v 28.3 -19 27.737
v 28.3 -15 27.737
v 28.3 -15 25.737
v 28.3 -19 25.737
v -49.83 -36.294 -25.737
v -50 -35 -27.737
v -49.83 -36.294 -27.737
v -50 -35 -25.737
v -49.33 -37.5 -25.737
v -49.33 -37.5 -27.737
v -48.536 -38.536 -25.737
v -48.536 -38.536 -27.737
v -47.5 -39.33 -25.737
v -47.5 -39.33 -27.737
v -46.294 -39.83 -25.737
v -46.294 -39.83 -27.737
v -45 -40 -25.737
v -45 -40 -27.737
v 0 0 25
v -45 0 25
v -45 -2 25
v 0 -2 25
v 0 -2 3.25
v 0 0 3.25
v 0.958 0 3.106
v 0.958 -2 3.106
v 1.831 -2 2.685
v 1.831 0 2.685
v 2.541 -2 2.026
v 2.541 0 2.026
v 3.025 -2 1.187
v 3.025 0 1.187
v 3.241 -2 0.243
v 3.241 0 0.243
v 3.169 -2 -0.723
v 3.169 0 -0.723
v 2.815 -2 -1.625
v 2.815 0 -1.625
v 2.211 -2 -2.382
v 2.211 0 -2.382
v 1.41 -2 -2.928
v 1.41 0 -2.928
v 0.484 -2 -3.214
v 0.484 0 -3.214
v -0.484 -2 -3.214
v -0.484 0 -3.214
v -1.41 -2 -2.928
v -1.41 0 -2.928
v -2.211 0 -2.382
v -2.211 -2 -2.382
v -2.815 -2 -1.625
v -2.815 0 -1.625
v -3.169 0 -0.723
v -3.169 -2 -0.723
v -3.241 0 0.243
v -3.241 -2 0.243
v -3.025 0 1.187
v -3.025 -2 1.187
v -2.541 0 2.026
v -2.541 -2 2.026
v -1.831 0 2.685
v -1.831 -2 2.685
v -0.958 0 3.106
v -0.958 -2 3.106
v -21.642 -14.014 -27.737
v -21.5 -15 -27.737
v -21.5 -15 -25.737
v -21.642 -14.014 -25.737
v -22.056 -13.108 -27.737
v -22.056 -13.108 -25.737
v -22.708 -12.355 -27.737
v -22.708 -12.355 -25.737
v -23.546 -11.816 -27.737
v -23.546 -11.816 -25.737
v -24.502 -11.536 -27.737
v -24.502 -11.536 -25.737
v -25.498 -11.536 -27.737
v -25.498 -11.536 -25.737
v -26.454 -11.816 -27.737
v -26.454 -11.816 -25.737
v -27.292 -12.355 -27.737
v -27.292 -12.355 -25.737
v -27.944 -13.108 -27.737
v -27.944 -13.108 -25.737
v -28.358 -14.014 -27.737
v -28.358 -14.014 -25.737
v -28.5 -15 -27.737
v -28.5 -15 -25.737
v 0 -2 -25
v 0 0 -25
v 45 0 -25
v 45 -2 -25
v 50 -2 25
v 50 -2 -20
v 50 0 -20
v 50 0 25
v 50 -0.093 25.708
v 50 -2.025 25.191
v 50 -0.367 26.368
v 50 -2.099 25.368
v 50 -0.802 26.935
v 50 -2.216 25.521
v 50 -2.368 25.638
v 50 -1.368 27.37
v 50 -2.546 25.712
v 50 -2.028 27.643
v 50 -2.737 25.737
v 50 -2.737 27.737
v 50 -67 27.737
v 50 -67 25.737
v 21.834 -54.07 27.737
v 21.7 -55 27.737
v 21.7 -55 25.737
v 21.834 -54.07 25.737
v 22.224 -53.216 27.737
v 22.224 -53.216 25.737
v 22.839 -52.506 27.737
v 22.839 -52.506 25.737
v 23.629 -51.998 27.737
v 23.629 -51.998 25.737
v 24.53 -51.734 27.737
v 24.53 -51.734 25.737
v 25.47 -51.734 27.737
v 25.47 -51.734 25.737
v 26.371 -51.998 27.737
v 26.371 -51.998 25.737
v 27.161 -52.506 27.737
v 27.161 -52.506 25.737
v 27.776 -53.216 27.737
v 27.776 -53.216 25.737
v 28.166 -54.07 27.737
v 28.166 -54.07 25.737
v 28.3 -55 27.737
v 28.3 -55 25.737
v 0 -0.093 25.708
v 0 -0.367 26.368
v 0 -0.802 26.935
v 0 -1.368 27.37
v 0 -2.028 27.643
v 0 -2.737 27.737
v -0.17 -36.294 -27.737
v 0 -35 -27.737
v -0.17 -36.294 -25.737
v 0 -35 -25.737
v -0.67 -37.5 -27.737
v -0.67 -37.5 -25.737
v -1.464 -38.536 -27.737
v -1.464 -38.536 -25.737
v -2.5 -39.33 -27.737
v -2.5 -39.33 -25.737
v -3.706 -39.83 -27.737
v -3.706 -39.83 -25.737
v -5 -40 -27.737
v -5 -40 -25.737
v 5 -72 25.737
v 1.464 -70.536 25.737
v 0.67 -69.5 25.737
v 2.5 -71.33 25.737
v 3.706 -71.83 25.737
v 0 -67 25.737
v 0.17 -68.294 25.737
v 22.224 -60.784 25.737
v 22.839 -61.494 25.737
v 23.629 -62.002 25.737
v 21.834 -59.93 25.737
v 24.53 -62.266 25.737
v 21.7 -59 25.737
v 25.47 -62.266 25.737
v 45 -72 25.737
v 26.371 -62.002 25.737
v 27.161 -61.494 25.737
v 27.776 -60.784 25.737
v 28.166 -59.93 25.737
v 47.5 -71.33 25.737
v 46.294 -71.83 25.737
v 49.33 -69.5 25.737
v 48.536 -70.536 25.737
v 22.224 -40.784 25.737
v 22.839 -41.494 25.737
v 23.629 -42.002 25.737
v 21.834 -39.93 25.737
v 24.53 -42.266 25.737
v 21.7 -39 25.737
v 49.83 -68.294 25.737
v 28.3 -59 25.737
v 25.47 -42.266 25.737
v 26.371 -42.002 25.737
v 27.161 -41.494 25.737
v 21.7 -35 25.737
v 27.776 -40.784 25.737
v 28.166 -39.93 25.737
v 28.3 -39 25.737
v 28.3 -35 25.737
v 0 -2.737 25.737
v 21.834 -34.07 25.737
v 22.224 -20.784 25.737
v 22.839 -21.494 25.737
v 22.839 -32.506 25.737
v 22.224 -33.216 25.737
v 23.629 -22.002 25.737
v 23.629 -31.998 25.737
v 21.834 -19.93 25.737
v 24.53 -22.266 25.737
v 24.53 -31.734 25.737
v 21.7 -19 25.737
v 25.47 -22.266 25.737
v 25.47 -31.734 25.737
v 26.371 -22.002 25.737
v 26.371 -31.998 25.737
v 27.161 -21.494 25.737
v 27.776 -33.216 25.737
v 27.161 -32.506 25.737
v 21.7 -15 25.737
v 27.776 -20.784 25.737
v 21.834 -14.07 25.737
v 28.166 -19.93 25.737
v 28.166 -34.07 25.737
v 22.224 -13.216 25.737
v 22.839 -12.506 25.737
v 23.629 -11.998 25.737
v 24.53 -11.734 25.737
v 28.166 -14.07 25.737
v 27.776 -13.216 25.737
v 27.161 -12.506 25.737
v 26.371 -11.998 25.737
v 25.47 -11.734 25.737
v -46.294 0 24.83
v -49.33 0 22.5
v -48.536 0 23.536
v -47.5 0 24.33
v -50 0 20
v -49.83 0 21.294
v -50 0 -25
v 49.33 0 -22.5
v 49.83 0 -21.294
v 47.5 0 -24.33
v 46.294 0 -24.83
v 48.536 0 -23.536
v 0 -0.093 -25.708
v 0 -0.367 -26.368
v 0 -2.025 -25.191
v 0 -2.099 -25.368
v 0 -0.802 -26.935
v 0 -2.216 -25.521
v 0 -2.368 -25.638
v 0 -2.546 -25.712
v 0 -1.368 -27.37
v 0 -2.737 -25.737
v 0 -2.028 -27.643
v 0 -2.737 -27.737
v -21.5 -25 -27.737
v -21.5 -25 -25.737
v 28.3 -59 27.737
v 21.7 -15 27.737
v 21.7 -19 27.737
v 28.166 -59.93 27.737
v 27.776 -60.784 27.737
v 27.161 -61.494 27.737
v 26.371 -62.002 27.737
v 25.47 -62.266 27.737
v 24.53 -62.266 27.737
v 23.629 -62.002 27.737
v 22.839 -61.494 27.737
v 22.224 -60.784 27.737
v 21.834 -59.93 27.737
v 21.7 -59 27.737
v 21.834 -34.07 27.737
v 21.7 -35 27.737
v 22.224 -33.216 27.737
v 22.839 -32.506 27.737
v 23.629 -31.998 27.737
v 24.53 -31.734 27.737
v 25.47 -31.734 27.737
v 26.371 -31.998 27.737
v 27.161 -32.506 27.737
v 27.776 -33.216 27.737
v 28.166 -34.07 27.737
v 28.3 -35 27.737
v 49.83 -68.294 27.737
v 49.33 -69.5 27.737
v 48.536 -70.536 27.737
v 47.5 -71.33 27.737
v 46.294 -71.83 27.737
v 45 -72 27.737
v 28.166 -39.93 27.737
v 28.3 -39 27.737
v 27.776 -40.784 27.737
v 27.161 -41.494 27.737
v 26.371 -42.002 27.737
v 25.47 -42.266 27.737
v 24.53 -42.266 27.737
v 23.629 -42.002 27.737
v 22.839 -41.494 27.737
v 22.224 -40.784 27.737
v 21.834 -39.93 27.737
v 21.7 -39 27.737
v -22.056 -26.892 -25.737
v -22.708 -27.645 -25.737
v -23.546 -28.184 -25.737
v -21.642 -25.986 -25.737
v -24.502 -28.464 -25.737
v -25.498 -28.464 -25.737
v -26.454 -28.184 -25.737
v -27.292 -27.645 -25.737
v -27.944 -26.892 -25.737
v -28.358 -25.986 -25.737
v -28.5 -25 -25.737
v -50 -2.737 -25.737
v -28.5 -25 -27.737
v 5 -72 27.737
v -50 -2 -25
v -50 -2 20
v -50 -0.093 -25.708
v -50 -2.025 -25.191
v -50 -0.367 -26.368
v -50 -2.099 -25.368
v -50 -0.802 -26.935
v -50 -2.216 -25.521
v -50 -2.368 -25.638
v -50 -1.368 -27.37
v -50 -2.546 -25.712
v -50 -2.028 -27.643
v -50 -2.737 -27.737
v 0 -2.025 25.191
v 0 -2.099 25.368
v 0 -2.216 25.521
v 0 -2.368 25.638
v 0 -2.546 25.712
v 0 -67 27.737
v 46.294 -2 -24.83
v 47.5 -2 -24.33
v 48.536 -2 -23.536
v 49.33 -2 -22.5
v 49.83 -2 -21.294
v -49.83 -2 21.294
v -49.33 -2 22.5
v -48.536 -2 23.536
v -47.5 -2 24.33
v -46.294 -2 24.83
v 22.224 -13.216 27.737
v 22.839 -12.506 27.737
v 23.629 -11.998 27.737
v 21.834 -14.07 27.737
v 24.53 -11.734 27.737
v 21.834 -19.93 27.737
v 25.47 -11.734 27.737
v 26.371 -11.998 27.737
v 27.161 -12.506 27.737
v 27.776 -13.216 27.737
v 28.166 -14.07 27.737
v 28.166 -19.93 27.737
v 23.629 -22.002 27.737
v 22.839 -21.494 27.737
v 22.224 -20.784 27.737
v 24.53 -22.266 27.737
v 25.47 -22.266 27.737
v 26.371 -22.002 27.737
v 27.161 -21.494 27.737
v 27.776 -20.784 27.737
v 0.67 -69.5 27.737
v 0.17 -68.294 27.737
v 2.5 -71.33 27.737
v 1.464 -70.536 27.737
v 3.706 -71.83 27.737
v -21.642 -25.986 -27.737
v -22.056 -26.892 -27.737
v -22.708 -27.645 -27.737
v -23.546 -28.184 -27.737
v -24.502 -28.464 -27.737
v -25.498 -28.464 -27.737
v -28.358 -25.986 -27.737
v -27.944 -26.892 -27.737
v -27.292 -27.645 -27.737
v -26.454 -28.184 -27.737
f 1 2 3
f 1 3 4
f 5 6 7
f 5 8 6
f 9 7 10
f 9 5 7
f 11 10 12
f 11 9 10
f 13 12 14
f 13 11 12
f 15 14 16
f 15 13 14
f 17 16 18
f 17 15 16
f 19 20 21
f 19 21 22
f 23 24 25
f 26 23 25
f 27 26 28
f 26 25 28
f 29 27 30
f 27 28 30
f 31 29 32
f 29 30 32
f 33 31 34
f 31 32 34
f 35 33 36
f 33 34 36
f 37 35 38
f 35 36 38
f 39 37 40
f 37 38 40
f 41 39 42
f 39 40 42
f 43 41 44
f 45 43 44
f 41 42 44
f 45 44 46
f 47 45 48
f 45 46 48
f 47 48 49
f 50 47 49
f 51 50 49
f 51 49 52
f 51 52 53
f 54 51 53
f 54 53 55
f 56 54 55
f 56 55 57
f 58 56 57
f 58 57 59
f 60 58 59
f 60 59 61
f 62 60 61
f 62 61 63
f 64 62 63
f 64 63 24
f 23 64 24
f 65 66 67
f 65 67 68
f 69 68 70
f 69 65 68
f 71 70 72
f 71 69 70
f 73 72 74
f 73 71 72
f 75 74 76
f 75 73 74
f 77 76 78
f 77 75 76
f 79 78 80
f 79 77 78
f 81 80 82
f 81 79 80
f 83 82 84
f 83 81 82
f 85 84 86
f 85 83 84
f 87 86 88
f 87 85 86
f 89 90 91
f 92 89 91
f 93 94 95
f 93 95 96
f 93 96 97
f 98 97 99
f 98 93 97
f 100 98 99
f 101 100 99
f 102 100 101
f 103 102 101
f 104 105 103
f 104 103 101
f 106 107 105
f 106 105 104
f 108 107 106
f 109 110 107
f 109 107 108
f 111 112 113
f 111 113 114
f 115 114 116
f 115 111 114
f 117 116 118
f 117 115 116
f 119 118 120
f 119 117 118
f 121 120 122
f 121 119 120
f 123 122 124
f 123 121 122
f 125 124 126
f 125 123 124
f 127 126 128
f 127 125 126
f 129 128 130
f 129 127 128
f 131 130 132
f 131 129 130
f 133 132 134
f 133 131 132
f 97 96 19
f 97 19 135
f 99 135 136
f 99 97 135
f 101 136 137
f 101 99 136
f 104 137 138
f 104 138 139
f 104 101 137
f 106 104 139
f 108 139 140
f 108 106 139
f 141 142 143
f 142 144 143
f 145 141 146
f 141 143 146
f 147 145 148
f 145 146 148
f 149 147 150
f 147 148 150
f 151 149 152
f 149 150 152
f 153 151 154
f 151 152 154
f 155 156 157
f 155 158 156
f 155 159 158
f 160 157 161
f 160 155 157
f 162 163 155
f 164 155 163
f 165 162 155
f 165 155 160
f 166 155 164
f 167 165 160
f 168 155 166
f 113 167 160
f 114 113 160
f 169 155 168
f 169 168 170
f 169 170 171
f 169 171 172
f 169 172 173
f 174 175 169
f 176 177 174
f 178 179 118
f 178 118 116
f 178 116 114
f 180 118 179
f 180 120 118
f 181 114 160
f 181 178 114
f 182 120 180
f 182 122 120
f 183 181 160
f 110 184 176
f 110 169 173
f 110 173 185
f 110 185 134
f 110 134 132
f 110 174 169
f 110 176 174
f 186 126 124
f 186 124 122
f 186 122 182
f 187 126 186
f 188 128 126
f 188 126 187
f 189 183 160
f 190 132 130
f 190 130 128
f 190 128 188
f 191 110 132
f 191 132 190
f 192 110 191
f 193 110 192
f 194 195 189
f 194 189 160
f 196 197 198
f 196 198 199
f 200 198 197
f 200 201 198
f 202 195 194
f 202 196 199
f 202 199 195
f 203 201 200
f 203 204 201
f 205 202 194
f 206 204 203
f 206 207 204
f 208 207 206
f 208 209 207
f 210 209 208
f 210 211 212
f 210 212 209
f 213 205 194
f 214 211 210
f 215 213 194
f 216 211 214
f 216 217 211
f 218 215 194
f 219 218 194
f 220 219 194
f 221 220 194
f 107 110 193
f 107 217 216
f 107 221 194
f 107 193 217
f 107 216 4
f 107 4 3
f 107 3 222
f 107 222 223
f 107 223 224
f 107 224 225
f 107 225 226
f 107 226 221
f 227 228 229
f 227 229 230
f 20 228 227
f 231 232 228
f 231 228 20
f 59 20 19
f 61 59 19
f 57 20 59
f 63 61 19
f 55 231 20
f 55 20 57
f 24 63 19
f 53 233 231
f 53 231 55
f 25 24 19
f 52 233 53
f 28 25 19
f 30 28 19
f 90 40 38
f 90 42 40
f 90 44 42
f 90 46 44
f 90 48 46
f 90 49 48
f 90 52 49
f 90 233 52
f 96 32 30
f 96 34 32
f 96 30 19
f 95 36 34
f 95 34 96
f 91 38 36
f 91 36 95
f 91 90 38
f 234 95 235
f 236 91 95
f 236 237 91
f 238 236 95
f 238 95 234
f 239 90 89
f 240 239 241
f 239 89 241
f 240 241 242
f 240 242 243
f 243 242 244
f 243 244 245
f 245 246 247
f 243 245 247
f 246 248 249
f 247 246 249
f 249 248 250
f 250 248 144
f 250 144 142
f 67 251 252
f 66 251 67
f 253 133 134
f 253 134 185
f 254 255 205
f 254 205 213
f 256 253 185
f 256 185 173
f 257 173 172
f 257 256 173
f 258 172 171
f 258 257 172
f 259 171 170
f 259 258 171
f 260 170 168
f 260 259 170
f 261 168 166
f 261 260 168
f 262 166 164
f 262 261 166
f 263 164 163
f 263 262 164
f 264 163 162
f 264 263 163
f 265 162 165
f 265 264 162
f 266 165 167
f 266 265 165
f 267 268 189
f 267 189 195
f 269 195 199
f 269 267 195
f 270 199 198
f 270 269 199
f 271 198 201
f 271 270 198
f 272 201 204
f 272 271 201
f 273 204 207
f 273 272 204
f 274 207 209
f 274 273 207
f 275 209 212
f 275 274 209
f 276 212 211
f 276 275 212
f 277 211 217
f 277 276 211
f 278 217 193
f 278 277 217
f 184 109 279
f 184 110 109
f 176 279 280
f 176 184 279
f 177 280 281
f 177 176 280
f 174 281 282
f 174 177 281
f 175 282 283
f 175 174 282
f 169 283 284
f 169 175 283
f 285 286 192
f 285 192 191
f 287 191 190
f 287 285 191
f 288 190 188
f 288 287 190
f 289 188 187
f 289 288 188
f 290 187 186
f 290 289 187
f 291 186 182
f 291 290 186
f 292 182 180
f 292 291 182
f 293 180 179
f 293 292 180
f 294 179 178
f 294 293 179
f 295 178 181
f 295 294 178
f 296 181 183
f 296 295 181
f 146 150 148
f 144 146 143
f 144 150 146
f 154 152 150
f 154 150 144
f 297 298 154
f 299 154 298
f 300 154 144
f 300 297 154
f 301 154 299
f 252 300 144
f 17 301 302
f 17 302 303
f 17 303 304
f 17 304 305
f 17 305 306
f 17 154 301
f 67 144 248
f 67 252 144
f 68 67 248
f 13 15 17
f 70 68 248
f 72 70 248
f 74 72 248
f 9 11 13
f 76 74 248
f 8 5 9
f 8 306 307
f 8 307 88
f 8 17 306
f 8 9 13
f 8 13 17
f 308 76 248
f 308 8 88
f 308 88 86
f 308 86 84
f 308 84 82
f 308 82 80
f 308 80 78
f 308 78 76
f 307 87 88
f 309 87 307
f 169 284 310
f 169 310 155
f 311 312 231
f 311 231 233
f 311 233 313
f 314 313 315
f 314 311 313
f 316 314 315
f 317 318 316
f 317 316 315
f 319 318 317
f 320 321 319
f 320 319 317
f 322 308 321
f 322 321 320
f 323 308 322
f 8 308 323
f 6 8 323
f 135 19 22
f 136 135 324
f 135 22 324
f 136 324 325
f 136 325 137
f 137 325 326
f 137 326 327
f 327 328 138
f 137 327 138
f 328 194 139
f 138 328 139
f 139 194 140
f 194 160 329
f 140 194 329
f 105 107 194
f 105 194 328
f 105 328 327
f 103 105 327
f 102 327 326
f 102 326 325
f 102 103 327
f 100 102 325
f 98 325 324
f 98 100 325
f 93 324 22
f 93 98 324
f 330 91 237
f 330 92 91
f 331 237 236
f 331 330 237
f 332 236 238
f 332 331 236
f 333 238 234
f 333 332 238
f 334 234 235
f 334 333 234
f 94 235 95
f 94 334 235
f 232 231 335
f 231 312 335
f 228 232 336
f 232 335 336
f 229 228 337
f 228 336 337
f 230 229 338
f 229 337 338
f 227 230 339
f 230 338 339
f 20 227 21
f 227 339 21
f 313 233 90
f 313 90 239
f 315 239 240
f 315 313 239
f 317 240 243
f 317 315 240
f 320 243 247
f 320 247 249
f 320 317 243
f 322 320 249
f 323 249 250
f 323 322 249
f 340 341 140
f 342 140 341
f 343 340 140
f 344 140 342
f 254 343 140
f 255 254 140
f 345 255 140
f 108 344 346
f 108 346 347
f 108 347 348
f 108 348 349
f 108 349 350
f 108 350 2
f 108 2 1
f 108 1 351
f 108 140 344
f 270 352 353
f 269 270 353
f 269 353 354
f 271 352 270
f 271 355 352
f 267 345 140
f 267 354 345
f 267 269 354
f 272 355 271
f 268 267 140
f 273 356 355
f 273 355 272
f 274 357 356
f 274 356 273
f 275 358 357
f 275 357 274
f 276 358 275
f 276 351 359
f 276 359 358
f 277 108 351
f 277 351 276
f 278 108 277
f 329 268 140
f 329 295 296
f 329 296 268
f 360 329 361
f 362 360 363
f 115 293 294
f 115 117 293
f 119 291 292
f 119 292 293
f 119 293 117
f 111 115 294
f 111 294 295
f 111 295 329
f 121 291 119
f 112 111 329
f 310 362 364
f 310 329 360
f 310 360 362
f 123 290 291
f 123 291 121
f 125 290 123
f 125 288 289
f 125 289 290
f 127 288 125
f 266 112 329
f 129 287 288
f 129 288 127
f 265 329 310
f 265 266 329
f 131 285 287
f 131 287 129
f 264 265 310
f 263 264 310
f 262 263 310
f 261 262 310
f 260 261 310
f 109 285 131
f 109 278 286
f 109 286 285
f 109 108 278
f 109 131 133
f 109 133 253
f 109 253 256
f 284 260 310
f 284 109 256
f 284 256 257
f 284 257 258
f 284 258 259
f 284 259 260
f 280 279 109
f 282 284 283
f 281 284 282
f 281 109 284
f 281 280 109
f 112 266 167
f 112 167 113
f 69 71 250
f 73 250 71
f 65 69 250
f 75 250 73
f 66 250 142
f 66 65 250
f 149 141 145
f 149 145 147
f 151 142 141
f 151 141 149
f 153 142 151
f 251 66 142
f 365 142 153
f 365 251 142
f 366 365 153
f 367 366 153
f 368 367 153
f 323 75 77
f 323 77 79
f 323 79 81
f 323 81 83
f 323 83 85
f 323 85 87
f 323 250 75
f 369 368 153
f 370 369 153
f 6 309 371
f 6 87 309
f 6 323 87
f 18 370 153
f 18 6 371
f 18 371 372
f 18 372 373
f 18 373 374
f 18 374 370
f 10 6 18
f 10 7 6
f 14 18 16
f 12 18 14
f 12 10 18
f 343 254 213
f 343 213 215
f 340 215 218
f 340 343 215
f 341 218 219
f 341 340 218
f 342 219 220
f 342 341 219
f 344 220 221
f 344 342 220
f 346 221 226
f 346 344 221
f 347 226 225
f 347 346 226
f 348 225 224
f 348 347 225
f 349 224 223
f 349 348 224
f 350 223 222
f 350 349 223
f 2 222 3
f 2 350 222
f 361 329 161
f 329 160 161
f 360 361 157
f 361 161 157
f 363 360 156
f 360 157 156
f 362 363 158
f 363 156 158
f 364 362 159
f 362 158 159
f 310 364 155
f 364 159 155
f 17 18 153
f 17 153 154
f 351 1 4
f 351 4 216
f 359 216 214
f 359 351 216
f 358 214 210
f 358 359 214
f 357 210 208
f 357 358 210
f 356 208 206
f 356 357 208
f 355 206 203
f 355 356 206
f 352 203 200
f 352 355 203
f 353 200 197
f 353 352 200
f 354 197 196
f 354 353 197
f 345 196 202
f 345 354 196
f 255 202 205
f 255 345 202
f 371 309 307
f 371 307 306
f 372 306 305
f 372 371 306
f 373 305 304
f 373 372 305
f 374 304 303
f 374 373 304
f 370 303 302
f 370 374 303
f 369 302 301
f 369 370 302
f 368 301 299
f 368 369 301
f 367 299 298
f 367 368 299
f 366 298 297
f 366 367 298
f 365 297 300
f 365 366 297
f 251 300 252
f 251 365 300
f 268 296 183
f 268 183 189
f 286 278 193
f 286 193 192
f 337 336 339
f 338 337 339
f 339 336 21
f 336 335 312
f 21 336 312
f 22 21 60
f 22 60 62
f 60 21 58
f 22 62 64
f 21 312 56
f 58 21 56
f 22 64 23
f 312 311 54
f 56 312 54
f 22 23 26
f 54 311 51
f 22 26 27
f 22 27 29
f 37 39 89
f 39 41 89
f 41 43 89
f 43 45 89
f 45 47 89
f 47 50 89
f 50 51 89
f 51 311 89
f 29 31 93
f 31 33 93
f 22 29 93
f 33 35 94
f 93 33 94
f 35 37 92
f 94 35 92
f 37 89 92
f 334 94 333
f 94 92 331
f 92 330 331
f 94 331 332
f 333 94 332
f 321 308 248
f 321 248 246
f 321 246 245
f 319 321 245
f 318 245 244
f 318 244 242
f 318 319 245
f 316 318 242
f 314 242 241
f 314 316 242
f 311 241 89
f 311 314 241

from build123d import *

# Parameters (mm, degrees)
SKETCH1_W          = 100
SKETCH1_H          = 50
BASE_FLANGE1_DEPTH = 2
SKETCH8_R          = 3.25
CUT_EXTRUDE1_DEPTH = 56.937465084
EDGE_FLANGE1_DEPTH = 50
EDGE_FLANGE2_DEPTH = 50
CUT_EXTRUDE2_DEPTH = 104.736569821
CUT_EXTRUDE3_DEPTH = 104.736569821
LPATTERN1_COUNT    = 3
LPATTERN1_PITCH    = 20
FILLET1_R          = 5


# Sheet-metal steps are written as plain solids
with BuildPart() as part:
    # Sketch1 → Base-Flange1 (new body)
    with BuildSketch(Plane(origin=(0, 0, 0), x_dir=(1, 0, 0), z_dir=(0, 1, 0))):
        Rectangle(SKETCH1_W, SKETCH1_H)
    extrude(amount=-BASE_FLANGE1_DEPTH)

    # Sketch8 → Cut-Extrude1 (cut, through all)
    with BuildSketch(Plane(origin=(0, 0, 0), x_dir=(1, 0, 0), z_dir=(0, 1, 0))):
        with Locations(Location((0, 0, 0), (0, 0, 270))):
            Circle(SKETCH8_R)
    extrude(amount=-CUT_EXTRUDE1_DEPTH, mode=Mode.SUBTRACT)

    # Edge-Flange1 section (across the edge) → Edge-Flange1 (add)
    with BuildSketch(Plane(origin=(50, -2, 25.7366), x_dir=(0, 0, -1), z_dir=(-1, 0, 0))):
        with BuildLine():
            Line((-2, 0.7366), (-2, 70))
            Line((-2, 70), (0, 70))
            Line((0, 70), (0, 0.7366))
            ThreePointArc((0, 0.7366), (0.215745145, 0.215745145), (0.7366, 0))
            Line((0.7366, 0), (0.7366, -2))
            ThreePointArc((0.7366, -2), (-1.198468417, -1.198468417), (-2, 0.7366))
        make_face()
    extrude(amount=EDGE_FLANGE1_DEPTH)

    # Edge-Flange2 section (across the edge) → Edge-Flange2 (add)
    with BuildSketch(Plane(origin=(-50, -2, -25.7366), x_dir=(0, 0, 1), z_dir=(1, 0, 0))):
        with BuildLine():
            Line((-2, 0.7366), (-2, 38))
            Line((-2, 38), (0, 38))
            Line((0, 38), (0, 0.7366))
            ThreePointArc((0, 0.7366), (0.215745145, 0.215745145), (0.7366, 0))
            Line((0.7366, 0), (0.7366, -2))
            ThreePointArc((0.7366, -2), (-1.198468417, -1.198468417), (-2, 0.7366))
        make_face()
    extrude(amount=EDGE_FLANGE2_DEPTH)

    # Sketch12 → Cut-Extrude2 (cut, through all)
    with BuildSketch(Plane.XY.offset(27.7366)):
        with BuildLine():
            Line((28.3, -55), (28.3, -59))
            ThreePointArc((28.3, -59), (25, -62.3), (21.7, -59))
            Line((21.7, -59), (21.7, -55))
            ThreePointArc((21.7, -55), (25, -51.7), (28.3, -55))
        make_face()
    cut_extrude2 = extrude(amount=-CUT_EXTRUDE2_DEPTH, mode=Mode.SUBTRACT)

    # Sketch16 → Cut-Extrude3 (cut, through all)
    with BuildSketch(Plane(origin=(0, 0, -27.7366), x_dir=(-1, 0, 0), z_dir=(0, 0, -1))):
        with BuildLine():
            Line((21.5, -25), (21.5, -15))
            ThreePointArc((21.5, -15), (25, -11.5), (28.5, -15))
            Line((28.5, -15), (28.5, -25))
            ThreePointArc((28.5, -25), (25, -28.5), (21.5, -25))
        make_face()
    extrude(amount=-CUT_EXTRUDE3_DEPTH, mode=Mode.SUBTRACT)

    # LPattern1: Cut-Extrude2 ×3
    with Locations(*[(0, i * LPATTERN1_PITCH, 0) for i in range(1, LPATTERN1_COUNT)]):
        add(cut_extrude2, mode=Mode.SUBTRACT)

    # Fillet1
    fillet1_edges = [part.edges().sort_by_distance(p)[0] for p in [
        (50, -72, 26.7366),
        (0, -72, 26.7366),
        (-50, -1, 25),
        (50, -1, -25),
        (-50, -40, -26.7366),
        (0, -40, -26.7366),
    ]]
    fillet(fillet1_edges, radius=FILLET1_R)


solid = part.part
